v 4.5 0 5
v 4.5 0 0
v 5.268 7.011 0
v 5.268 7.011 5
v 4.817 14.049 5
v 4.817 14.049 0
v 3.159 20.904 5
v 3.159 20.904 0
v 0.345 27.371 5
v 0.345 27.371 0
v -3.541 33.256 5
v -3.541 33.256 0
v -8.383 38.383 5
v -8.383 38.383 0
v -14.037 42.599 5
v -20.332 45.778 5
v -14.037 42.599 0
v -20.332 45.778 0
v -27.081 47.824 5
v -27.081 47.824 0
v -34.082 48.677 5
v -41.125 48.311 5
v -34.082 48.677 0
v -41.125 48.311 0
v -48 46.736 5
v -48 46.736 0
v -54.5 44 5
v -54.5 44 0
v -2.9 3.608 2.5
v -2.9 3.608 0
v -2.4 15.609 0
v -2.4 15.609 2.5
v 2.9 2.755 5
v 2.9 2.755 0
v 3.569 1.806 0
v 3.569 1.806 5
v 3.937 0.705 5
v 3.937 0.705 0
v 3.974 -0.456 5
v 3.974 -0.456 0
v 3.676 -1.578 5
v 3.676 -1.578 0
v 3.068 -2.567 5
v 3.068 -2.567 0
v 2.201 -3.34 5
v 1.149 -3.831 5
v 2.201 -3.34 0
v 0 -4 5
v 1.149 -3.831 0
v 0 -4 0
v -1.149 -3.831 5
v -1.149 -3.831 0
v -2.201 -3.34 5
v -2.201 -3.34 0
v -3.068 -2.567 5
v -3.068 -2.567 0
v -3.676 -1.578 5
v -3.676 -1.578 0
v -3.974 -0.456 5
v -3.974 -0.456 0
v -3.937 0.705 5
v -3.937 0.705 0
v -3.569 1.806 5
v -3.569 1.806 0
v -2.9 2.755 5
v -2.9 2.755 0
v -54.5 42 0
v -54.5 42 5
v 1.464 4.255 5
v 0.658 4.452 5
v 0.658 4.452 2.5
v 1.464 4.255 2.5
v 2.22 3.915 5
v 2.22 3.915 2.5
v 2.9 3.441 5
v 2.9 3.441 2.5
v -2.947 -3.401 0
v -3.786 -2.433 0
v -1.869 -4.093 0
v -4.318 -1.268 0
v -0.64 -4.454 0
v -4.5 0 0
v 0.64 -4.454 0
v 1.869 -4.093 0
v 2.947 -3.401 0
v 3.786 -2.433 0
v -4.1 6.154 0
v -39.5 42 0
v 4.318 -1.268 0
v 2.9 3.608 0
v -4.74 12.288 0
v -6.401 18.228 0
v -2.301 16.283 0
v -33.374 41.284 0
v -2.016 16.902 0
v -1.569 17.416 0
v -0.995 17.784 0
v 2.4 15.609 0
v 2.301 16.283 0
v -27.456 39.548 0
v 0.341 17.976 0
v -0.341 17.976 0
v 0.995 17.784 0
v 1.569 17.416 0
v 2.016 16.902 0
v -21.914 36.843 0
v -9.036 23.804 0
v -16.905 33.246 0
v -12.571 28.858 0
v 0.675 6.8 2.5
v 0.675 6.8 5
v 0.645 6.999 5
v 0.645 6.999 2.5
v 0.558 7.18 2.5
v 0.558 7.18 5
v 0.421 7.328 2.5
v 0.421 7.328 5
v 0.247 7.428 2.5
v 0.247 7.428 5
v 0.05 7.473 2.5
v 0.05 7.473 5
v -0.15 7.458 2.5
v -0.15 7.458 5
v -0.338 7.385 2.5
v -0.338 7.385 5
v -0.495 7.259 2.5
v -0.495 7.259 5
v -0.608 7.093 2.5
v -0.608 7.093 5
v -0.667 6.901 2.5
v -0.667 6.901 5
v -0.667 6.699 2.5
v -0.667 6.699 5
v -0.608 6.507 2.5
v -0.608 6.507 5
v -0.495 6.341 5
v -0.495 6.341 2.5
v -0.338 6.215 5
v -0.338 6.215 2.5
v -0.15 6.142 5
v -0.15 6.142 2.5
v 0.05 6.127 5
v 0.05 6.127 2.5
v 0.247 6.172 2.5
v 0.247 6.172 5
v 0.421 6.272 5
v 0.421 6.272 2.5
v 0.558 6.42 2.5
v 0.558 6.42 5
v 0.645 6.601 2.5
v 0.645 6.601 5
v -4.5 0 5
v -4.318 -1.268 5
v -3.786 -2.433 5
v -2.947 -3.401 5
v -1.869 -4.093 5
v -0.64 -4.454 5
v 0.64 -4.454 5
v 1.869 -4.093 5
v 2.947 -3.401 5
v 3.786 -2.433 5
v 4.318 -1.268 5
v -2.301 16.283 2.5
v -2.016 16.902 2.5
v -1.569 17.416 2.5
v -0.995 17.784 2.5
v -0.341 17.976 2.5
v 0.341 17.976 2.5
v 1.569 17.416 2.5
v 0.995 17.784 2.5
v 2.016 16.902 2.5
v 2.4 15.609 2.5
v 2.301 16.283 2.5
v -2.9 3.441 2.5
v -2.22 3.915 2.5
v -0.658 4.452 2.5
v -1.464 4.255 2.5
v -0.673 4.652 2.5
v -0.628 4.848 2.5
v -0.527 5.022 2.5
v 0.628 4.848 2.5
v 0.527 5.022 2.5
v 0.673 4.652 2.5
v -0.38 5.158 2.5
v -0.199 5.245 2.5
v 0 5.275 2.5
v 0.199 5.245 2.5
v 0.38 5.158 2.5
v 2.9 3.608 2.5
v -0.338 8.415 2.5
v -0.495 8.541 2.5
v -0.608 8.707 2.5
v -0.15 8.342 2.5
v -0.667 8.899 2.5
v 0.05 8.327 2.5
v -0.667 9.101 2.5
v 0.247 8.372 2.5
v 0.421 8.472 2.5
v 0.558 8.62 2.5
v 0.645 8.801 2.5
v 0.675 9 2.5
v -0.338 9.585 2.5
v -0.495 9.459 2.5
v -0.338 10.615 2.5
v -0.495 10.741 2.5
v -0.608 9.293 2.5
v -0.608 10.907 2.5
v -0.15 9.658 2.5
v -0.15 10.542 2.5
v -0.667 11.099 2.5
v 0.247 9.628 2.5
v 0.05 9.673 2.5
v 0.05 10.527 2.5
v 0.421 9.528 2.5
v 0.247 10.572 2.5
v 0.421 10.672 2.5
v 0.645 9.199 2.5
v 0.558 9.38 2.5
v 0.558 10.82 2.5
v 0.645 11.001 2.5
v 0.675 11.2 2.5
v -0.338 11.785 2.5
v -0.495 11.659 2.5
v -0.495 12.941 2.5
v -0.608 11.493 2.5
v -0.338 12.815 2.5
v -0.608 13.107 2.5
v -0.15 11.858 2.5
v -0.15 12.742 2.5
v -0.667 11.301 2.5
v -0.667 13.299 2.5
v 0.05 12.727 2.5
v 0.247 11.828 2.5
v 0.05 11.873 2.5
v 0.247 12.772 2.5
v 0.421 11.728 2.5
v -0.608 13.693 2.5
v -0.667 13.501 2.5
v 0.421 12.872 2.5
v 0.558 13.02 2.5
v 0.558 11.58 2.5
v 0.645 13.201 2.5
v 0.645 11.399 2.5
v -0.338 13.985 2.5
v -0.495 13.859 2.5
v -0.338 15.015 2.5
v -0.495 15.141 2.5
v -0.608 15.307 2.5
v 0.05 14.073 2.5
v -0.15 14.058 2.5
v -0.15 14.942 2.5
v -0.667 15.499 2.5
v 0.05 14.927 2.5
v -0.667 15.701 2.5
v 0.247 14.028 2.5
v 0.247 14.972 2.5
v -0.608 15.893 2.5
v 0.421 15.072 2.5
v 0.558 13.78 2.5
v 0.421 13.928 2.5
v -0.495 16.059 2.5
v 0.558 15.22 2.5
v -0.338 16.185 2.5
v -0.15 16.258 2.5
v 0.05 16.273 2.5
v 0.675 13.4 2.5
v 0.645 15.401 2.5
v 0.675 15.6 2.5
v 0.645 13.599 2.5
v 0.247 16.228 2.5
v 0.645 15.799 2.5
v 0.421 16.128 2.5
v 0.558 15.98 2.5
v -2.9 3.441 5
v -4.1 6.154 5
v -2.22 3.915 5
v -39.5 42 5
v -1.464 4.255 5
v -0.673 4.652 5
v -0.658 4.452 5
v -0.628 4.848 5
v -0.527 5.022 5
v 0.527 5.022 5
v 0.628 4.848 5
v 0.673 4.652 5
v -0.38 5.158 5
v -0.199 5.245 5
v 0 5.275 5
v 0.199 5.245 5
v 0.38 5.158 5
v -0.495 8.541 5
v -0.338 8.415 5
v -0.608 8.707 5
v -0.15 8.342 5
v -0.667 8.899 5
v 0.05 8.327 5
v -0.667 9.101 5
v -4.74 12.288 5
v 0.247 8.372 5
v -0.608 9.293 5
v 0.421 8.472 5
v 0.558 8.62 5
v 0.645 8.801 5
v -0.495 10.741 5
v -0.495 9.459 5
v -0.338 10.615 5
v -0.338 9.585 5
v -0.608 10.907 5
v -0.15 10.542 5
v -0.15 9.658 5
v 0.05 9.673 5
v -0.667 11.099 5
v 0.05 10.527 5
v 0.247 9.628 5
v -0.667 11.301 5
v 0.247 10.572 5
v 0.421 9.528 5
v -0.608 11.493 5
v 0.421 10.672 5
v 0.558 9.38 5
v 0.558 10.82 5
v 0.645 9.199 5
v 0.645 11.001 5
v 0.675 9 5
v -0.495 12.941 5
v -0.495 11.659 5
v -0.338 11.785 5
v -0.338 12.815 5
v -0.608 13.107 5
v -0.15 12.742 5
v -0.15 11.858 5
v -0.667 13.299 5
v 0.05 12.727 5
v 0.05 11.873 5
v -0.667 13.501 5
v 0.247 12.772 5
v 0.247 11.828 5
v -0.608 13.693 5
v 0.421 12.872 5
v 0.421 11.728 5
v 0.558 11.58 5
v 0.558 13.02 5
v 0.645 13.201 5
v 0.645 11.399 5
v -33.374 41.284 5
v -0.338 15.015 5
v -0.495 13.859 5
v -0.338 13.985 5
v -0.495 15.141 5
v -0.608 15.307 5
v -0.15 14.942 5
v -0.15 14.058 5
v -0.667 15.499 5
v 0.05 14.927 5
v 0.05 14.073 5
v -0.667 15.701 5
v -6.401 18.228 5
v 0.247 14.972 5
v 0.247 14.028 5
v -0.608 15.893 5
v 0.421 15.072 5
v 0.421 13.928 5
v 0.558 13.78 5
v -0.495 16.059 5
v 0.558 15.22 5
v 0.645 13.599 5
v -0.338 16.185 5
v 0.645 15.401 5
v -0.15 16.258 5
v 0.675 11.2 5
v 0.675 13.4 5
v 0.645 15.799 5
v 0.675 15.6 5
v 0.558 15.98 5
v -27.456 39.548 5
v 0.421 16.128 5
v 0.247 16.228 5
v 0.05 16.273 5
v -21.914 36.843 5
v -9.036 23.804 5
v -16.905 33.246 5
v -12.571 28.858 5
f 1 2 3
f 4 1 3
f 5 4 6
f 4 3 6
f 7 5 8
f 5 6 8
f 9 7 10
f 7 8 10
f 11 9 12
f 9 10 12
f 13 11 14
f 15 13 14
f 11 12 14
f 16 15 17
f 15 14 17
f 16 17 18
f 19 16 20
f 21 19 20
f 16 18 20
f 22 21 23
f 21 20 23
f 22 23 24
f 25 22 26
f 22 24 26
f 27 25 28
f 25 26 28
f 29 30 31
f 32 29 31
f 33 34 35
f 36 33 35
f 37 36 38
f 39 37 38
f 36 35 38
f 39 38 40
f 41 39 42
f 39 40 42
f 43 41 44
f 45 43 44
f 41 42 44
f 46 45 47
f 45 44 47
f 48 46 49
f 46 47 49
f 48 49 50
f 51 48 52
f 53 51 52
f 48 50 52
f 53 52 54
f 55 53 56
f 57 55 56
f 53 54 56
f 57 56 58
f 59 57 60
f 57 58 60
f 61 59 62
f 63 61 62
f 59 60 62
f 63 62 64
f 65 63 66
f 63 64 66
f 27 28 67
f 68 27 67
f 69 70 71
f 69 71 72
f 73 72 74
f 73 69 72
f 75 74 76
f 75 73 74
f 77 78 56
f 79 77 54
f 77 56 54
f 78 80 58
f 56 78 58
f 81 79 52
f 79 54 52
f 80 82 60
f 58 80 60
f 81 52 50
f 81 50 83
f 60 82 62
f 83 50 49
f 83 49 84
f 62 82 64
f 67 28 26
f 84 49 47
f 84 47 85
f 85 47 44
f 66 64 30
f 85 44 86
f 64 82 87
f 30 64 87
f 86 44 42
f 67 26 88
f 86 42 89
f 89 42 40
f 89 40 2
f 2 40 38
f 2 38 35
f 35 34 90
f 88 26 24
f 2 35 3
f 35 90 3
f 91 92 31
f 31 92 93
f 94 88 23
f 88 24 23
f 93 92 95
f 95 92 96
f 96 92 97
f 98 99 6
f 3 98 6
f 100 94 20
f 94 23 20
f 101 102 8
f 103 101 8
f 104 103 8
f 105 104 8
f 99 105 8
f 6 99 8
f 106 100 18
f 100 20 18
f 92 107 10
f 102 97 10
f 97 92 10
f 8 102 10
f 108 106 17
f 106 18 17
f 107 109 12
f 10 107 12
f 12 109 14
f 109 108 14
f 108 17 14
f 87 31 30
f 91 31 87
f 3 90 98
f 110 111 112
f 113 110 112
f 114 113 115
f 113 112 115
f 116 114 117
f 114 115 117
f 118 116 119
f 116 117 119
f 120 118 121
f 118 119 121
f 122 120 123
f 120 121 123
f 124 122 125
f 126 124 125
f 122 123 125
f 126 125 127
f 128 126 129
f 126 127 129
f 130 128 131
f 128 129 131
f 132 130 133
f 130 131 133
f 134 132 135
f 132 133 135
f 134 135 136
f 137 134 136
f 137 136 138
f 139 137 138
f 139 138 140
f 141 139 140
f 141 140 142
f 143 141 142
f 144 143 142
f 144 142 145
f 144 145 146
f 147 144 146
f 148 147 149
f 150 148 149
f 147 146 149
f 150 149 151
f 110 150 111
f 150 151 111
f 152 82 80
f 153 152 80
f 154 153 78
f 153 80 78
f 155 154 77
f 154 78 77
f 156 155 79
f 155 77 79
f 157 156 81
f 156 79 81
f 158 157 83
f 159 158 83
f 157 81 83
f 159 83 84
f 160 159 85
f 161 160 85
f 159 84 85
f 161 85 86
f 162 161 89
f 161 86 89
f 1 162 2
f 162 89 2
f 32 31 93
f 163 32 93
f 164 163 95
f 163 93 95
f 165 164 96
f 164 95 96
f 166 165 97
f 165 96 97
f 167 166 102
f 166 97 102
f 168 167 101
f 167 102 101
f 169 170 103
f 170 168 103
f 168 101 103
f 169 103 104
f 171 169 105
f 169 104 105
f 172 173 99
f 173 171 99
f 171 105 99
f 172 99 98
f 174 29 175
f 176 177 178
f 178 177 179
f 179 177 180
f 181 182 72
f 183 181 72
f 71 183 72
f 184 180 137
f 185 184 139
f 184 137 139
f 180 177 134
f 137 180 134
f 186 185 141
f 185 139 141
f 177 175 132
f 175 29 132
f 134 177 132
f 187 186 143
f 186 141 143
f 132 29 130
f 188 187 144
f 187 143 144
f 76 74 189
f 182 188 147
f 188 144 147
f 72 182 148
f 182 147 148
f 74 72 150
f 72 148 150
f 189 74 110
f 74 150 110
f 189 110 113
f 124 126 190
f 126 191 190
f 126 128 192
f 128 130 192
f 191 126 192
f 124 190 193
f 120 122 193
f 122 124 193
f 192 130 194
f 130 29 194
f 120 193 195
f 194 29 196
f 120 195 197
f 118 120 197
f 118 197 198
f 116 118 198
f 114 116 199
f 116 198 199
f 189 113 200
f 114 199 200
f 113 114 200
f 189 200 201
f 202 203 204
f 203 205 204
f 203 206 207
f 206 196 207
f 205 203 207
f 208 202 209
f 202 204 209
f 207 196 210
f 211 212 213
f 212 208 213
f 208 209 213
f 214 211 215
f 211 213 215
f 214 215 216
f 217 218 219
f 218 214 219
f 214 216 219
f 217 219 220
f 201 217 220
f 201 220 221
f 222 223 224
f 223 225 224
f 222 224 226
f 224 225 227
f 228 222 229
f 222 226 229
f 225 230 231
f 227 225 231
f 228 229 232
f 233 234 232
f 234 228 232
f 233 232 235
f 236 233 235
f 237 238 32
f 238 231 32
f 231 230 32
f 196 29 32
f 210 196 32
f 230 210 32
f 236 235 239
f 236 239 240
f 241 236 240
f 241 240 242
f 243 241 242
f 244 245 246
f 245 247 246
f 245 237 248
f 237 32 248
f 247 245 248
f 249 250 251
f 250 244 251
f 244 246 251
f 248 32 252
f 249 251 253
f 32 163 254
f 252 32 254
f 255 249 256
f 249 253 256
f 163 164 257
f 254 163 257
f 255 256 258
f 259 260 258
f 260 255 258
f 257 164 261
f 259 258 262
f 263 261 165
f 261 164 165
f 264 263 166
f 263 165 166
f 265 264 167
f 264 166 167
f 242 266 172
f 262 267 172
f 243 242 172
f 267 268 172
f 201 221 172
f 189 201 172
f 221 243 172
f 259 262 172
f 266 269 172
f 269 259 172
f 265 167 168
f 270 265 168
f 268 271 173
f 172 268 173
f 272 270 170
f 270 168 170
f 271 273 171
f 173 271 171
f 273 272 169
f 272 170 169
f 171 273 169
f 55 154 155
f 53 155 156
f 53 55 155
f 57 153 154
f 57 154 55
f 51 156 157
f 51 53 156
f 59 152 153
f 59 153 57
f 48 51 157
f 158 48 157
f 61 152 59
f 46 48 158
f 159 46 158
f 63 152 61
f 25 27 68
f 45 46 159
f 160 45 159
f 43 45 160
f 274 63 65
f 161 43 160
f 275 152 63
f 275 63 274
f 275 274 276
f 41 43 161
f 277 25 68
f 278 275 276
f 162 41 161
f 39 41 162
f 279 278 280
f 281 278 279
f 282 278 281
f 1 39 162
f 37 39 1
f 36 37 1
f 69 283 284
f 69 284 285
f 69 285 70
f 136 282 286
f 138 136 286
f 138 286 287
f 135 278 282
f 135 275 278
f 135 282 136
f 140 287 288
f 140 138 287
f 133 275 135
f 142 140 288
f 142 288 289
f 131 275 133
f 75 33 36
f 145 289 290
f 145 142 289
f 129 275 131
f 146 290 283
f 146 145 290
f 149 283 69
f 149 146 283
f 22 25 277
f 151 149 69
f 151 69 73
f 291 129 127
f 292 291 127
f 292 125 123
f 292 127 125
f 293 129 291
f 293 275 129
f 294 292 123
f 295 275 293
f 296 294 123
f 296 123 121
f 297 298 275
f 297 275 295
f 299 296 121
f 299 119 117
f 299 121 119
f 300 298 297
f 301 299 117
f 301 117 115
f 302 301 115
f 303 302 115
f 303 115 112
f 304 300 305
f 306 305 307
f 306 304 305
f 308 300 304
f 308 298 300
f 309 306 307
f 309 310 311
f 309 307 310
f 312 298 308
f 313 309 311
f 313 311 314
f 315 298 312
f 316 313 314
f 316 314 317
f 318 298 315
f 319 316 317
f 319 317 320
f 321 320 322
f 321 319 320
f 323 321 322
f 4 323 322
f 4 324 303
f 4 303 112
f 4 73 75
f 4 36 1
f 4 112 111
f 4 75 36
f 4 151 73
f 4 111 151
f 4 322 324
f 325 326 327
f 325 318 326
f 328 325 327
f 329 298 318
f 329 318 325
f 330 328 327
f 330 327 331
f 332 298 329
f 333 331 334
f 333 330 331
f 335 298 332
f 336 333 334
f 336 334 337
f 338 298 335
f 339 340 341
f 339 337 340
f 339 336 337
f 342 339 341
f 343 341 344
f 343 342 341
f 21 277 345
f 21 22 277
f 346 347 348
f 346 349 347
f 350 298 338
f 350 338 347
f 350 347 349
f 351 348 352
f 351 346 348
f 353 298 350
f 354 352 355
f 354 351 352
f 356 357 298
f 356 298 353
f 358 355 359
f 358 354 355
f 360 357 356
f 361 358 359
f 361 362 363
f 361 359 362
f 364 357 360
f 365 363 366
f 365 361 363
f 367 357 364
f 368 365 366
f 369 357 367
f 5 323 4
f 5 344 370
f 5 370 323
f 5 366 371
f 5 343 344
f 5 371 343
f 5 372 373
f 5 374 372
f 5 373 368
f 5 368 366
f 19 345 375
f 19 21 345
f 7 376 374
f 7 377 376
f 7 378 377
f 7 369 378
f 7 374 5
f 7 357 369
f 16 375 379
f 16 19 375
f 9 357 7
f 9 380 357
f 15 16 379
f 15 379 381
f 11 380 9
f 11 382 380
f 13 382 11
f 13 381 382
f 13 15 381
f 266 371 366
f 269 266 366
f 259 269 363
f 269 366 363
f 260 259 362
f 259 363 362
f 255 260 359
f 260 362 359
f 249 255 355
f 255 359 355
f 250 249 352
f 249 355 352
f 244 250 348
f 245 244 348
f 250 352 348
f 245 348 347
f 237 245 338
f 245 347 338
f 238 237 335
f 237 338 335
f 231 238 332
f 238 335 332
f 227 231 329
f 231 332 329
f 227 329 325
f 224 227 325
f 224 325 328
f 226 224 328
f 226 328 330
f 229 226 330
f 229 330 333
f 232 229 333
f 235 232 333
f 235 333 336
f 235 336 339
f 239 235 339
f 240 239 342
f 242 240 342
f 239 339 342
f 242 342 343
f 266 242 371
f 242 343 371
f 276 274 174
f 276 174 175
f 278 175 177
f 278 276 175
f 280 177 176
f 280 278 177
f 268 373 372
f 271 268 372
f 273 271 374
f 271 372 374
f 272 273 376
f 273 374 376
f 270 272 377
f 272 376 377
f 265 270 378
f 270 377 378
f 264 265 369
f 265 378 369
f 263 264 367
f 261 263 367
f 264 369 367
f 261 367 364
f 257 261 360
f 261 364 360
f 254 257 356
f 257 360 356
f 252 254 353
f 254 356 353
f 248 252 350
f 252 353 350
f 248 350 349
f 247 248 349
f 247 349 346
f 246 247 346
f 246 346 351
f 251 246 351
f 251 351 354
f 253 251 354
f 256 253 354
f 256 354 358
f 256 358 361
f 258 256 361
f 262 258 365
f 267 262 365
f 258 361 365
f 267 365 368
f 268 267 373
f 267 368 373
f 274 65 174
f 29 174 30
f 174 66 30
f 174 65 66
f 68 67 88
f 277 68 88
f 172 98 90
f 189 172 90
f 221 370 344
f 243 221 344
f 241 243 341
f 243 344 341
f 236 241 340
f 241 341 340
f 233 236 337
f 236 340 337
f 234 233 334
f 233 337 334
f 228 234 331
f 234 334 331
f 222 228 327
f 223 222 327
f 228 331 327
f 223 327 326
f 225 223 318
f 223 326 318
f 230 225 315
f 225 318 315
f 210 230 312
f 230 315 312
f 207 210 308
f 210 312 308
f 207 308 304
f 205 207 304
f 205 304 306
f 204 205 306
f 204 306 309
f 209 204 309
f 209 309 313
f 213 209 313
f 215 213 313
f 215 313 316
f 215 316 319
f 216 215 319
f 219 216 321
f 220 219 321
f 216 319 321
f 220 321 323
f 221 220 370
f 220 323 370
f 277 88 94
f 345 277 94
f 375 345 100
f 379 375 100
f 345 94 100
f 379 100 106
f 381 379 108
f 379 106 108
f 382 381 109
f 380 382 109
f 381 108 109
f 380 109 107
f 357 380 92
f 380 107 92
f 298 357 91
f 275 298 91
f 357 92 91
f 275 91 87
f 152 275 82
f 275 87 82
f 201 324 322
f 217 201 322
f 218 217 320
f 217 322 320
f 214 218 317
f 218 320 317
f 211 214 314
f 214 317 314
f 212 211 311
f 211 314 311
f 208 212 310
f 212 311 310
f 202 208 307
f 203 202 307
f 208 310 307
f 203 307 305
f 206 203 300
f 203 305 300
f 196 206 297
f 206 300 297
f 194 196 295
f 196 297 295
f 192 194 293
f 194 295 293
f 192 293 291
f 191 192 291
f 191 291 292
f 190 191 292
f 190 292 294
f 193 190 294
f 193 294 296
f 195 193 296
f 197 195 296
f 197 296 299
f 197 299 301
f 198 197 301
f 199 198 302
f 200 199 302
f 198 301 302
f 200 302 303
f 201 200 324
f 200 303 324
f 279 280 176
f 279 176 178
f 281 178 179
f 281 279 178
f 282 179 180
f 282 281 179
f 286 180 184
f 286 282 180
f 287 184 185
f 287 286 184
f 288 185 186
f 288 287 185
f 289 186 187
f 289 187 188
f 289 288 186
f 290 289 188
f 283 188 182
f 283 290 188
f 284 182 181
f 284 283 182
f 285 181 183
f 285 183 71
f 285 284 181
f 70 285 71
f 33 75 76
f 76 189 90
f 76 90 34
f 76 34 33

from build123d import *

# Parameters (mm, degrees)
BOSS_EXTRUDE1_DEPTH = 5
BOSS_EXTRUDE2_START = 5
SKETCH1_3_R         = 0.675
BOSS_EXTRUDE2_DEPTH = 2.5


with BuildPart() as part:
    # Sketch1 → Boss-Extrude1 (new body)
    with BuildSketch(Plane.XY):
        with BuildLine():
            ThreePointArc((4.5, 0), (-11.118671164, 40.613600031), (-54.5, 44))
            Line((-54.5, 44), (-54.5, 42))
            Line((-54.5, 42), (-39.5, 42))
            ThreePointArc((-39.5, 42), (-12.570901459, 28.857582118), (-4.5, 0))
            ThreePointArc((-4.5, 0), (0, -4.5), (4.5, 0))
        make_face()
        with BuildLine():
            Line((-2.900000039, 3.608329712), (-2.399984199, 15.608708951))
            ThreePointArc((-2.399984199, 15.608708951), (1e-09, 18), (2.399984199, 15.608708949))
            Line((2.399984199, 15.608708949), (2.899999961, 3.608329727))
            Line((2.899999961, 3.608329727), (2.899999994, 2.754995469))
            ThreePointArc((2.899999994, 2.754995469), (9e-09, -4), (-2.900000006, 2.754995456))
            Line((-2.900000006, 2.754995456), (-2.900000039, 3.608329712))
        make_face(mode=Mode.SUBTRACT)
    extrude(amount=BOSS_EXTRUDE1_DEPTH)

    # Sketch1<3> → Boss-Extrude2 (add)
    with BuildSketch(Plane.XY.offset(BOSS_EXTRUDE2_START)):
        with BuildLine():
            Line((2.899999967, 3.440930135), (2.899999961, 3.608329727))
            Line((2.899999961, 3.608329727), (2.399984199, 15.608708949))
            ThreePointArc((2.399984199, 15.608708949), (1e-09, 18), (-2.399984199, 15.608708951))
            Line((-2.399984199, 15.608708951), (-2.900000039, 3.608329712))
            Line((-2.900000039, 3.608329712), (-2.900000033, 3.440930079))
            ThreePointArc((-2.900000033, 3.440930079), (-1.84960355, 4.102312361), (-0.658476506, 4.4515625))
            ThreePointArc((-0.658476506, 4.4515625), (0, 5.275), (0.658476506, 4.4515625))
            ThreePointArc((0.658476506, 4.4515625), (1.849603511, 4.102312379), (2.899999967, 3.440930135))
        make_face()
        with Locations((0, 11.2)):
            Circle(SKETCH1_3_R, mode=Mode.SUBTRACT)
        with Locations((0, 13.4)):
            Circle(SKETCH1_3_R, mode=Mode.SUBTRACT)
        with Locations((0, 15.6)):
            Circle(SKETCH1_3_R, mode=Mode.SUBTRACT)
        with Locations((0, 6.8)):
            Circle(SKETCH1_3_R, mode=Mode.SUBTRACT)
        with Locations((0, 9)):
            Circle(SKETCH1_3_R, mode=Mode.SUBTRACT)
    extrude(amount=-BOSS_EXTRUDE2_DEPTH)


solid = part.part
